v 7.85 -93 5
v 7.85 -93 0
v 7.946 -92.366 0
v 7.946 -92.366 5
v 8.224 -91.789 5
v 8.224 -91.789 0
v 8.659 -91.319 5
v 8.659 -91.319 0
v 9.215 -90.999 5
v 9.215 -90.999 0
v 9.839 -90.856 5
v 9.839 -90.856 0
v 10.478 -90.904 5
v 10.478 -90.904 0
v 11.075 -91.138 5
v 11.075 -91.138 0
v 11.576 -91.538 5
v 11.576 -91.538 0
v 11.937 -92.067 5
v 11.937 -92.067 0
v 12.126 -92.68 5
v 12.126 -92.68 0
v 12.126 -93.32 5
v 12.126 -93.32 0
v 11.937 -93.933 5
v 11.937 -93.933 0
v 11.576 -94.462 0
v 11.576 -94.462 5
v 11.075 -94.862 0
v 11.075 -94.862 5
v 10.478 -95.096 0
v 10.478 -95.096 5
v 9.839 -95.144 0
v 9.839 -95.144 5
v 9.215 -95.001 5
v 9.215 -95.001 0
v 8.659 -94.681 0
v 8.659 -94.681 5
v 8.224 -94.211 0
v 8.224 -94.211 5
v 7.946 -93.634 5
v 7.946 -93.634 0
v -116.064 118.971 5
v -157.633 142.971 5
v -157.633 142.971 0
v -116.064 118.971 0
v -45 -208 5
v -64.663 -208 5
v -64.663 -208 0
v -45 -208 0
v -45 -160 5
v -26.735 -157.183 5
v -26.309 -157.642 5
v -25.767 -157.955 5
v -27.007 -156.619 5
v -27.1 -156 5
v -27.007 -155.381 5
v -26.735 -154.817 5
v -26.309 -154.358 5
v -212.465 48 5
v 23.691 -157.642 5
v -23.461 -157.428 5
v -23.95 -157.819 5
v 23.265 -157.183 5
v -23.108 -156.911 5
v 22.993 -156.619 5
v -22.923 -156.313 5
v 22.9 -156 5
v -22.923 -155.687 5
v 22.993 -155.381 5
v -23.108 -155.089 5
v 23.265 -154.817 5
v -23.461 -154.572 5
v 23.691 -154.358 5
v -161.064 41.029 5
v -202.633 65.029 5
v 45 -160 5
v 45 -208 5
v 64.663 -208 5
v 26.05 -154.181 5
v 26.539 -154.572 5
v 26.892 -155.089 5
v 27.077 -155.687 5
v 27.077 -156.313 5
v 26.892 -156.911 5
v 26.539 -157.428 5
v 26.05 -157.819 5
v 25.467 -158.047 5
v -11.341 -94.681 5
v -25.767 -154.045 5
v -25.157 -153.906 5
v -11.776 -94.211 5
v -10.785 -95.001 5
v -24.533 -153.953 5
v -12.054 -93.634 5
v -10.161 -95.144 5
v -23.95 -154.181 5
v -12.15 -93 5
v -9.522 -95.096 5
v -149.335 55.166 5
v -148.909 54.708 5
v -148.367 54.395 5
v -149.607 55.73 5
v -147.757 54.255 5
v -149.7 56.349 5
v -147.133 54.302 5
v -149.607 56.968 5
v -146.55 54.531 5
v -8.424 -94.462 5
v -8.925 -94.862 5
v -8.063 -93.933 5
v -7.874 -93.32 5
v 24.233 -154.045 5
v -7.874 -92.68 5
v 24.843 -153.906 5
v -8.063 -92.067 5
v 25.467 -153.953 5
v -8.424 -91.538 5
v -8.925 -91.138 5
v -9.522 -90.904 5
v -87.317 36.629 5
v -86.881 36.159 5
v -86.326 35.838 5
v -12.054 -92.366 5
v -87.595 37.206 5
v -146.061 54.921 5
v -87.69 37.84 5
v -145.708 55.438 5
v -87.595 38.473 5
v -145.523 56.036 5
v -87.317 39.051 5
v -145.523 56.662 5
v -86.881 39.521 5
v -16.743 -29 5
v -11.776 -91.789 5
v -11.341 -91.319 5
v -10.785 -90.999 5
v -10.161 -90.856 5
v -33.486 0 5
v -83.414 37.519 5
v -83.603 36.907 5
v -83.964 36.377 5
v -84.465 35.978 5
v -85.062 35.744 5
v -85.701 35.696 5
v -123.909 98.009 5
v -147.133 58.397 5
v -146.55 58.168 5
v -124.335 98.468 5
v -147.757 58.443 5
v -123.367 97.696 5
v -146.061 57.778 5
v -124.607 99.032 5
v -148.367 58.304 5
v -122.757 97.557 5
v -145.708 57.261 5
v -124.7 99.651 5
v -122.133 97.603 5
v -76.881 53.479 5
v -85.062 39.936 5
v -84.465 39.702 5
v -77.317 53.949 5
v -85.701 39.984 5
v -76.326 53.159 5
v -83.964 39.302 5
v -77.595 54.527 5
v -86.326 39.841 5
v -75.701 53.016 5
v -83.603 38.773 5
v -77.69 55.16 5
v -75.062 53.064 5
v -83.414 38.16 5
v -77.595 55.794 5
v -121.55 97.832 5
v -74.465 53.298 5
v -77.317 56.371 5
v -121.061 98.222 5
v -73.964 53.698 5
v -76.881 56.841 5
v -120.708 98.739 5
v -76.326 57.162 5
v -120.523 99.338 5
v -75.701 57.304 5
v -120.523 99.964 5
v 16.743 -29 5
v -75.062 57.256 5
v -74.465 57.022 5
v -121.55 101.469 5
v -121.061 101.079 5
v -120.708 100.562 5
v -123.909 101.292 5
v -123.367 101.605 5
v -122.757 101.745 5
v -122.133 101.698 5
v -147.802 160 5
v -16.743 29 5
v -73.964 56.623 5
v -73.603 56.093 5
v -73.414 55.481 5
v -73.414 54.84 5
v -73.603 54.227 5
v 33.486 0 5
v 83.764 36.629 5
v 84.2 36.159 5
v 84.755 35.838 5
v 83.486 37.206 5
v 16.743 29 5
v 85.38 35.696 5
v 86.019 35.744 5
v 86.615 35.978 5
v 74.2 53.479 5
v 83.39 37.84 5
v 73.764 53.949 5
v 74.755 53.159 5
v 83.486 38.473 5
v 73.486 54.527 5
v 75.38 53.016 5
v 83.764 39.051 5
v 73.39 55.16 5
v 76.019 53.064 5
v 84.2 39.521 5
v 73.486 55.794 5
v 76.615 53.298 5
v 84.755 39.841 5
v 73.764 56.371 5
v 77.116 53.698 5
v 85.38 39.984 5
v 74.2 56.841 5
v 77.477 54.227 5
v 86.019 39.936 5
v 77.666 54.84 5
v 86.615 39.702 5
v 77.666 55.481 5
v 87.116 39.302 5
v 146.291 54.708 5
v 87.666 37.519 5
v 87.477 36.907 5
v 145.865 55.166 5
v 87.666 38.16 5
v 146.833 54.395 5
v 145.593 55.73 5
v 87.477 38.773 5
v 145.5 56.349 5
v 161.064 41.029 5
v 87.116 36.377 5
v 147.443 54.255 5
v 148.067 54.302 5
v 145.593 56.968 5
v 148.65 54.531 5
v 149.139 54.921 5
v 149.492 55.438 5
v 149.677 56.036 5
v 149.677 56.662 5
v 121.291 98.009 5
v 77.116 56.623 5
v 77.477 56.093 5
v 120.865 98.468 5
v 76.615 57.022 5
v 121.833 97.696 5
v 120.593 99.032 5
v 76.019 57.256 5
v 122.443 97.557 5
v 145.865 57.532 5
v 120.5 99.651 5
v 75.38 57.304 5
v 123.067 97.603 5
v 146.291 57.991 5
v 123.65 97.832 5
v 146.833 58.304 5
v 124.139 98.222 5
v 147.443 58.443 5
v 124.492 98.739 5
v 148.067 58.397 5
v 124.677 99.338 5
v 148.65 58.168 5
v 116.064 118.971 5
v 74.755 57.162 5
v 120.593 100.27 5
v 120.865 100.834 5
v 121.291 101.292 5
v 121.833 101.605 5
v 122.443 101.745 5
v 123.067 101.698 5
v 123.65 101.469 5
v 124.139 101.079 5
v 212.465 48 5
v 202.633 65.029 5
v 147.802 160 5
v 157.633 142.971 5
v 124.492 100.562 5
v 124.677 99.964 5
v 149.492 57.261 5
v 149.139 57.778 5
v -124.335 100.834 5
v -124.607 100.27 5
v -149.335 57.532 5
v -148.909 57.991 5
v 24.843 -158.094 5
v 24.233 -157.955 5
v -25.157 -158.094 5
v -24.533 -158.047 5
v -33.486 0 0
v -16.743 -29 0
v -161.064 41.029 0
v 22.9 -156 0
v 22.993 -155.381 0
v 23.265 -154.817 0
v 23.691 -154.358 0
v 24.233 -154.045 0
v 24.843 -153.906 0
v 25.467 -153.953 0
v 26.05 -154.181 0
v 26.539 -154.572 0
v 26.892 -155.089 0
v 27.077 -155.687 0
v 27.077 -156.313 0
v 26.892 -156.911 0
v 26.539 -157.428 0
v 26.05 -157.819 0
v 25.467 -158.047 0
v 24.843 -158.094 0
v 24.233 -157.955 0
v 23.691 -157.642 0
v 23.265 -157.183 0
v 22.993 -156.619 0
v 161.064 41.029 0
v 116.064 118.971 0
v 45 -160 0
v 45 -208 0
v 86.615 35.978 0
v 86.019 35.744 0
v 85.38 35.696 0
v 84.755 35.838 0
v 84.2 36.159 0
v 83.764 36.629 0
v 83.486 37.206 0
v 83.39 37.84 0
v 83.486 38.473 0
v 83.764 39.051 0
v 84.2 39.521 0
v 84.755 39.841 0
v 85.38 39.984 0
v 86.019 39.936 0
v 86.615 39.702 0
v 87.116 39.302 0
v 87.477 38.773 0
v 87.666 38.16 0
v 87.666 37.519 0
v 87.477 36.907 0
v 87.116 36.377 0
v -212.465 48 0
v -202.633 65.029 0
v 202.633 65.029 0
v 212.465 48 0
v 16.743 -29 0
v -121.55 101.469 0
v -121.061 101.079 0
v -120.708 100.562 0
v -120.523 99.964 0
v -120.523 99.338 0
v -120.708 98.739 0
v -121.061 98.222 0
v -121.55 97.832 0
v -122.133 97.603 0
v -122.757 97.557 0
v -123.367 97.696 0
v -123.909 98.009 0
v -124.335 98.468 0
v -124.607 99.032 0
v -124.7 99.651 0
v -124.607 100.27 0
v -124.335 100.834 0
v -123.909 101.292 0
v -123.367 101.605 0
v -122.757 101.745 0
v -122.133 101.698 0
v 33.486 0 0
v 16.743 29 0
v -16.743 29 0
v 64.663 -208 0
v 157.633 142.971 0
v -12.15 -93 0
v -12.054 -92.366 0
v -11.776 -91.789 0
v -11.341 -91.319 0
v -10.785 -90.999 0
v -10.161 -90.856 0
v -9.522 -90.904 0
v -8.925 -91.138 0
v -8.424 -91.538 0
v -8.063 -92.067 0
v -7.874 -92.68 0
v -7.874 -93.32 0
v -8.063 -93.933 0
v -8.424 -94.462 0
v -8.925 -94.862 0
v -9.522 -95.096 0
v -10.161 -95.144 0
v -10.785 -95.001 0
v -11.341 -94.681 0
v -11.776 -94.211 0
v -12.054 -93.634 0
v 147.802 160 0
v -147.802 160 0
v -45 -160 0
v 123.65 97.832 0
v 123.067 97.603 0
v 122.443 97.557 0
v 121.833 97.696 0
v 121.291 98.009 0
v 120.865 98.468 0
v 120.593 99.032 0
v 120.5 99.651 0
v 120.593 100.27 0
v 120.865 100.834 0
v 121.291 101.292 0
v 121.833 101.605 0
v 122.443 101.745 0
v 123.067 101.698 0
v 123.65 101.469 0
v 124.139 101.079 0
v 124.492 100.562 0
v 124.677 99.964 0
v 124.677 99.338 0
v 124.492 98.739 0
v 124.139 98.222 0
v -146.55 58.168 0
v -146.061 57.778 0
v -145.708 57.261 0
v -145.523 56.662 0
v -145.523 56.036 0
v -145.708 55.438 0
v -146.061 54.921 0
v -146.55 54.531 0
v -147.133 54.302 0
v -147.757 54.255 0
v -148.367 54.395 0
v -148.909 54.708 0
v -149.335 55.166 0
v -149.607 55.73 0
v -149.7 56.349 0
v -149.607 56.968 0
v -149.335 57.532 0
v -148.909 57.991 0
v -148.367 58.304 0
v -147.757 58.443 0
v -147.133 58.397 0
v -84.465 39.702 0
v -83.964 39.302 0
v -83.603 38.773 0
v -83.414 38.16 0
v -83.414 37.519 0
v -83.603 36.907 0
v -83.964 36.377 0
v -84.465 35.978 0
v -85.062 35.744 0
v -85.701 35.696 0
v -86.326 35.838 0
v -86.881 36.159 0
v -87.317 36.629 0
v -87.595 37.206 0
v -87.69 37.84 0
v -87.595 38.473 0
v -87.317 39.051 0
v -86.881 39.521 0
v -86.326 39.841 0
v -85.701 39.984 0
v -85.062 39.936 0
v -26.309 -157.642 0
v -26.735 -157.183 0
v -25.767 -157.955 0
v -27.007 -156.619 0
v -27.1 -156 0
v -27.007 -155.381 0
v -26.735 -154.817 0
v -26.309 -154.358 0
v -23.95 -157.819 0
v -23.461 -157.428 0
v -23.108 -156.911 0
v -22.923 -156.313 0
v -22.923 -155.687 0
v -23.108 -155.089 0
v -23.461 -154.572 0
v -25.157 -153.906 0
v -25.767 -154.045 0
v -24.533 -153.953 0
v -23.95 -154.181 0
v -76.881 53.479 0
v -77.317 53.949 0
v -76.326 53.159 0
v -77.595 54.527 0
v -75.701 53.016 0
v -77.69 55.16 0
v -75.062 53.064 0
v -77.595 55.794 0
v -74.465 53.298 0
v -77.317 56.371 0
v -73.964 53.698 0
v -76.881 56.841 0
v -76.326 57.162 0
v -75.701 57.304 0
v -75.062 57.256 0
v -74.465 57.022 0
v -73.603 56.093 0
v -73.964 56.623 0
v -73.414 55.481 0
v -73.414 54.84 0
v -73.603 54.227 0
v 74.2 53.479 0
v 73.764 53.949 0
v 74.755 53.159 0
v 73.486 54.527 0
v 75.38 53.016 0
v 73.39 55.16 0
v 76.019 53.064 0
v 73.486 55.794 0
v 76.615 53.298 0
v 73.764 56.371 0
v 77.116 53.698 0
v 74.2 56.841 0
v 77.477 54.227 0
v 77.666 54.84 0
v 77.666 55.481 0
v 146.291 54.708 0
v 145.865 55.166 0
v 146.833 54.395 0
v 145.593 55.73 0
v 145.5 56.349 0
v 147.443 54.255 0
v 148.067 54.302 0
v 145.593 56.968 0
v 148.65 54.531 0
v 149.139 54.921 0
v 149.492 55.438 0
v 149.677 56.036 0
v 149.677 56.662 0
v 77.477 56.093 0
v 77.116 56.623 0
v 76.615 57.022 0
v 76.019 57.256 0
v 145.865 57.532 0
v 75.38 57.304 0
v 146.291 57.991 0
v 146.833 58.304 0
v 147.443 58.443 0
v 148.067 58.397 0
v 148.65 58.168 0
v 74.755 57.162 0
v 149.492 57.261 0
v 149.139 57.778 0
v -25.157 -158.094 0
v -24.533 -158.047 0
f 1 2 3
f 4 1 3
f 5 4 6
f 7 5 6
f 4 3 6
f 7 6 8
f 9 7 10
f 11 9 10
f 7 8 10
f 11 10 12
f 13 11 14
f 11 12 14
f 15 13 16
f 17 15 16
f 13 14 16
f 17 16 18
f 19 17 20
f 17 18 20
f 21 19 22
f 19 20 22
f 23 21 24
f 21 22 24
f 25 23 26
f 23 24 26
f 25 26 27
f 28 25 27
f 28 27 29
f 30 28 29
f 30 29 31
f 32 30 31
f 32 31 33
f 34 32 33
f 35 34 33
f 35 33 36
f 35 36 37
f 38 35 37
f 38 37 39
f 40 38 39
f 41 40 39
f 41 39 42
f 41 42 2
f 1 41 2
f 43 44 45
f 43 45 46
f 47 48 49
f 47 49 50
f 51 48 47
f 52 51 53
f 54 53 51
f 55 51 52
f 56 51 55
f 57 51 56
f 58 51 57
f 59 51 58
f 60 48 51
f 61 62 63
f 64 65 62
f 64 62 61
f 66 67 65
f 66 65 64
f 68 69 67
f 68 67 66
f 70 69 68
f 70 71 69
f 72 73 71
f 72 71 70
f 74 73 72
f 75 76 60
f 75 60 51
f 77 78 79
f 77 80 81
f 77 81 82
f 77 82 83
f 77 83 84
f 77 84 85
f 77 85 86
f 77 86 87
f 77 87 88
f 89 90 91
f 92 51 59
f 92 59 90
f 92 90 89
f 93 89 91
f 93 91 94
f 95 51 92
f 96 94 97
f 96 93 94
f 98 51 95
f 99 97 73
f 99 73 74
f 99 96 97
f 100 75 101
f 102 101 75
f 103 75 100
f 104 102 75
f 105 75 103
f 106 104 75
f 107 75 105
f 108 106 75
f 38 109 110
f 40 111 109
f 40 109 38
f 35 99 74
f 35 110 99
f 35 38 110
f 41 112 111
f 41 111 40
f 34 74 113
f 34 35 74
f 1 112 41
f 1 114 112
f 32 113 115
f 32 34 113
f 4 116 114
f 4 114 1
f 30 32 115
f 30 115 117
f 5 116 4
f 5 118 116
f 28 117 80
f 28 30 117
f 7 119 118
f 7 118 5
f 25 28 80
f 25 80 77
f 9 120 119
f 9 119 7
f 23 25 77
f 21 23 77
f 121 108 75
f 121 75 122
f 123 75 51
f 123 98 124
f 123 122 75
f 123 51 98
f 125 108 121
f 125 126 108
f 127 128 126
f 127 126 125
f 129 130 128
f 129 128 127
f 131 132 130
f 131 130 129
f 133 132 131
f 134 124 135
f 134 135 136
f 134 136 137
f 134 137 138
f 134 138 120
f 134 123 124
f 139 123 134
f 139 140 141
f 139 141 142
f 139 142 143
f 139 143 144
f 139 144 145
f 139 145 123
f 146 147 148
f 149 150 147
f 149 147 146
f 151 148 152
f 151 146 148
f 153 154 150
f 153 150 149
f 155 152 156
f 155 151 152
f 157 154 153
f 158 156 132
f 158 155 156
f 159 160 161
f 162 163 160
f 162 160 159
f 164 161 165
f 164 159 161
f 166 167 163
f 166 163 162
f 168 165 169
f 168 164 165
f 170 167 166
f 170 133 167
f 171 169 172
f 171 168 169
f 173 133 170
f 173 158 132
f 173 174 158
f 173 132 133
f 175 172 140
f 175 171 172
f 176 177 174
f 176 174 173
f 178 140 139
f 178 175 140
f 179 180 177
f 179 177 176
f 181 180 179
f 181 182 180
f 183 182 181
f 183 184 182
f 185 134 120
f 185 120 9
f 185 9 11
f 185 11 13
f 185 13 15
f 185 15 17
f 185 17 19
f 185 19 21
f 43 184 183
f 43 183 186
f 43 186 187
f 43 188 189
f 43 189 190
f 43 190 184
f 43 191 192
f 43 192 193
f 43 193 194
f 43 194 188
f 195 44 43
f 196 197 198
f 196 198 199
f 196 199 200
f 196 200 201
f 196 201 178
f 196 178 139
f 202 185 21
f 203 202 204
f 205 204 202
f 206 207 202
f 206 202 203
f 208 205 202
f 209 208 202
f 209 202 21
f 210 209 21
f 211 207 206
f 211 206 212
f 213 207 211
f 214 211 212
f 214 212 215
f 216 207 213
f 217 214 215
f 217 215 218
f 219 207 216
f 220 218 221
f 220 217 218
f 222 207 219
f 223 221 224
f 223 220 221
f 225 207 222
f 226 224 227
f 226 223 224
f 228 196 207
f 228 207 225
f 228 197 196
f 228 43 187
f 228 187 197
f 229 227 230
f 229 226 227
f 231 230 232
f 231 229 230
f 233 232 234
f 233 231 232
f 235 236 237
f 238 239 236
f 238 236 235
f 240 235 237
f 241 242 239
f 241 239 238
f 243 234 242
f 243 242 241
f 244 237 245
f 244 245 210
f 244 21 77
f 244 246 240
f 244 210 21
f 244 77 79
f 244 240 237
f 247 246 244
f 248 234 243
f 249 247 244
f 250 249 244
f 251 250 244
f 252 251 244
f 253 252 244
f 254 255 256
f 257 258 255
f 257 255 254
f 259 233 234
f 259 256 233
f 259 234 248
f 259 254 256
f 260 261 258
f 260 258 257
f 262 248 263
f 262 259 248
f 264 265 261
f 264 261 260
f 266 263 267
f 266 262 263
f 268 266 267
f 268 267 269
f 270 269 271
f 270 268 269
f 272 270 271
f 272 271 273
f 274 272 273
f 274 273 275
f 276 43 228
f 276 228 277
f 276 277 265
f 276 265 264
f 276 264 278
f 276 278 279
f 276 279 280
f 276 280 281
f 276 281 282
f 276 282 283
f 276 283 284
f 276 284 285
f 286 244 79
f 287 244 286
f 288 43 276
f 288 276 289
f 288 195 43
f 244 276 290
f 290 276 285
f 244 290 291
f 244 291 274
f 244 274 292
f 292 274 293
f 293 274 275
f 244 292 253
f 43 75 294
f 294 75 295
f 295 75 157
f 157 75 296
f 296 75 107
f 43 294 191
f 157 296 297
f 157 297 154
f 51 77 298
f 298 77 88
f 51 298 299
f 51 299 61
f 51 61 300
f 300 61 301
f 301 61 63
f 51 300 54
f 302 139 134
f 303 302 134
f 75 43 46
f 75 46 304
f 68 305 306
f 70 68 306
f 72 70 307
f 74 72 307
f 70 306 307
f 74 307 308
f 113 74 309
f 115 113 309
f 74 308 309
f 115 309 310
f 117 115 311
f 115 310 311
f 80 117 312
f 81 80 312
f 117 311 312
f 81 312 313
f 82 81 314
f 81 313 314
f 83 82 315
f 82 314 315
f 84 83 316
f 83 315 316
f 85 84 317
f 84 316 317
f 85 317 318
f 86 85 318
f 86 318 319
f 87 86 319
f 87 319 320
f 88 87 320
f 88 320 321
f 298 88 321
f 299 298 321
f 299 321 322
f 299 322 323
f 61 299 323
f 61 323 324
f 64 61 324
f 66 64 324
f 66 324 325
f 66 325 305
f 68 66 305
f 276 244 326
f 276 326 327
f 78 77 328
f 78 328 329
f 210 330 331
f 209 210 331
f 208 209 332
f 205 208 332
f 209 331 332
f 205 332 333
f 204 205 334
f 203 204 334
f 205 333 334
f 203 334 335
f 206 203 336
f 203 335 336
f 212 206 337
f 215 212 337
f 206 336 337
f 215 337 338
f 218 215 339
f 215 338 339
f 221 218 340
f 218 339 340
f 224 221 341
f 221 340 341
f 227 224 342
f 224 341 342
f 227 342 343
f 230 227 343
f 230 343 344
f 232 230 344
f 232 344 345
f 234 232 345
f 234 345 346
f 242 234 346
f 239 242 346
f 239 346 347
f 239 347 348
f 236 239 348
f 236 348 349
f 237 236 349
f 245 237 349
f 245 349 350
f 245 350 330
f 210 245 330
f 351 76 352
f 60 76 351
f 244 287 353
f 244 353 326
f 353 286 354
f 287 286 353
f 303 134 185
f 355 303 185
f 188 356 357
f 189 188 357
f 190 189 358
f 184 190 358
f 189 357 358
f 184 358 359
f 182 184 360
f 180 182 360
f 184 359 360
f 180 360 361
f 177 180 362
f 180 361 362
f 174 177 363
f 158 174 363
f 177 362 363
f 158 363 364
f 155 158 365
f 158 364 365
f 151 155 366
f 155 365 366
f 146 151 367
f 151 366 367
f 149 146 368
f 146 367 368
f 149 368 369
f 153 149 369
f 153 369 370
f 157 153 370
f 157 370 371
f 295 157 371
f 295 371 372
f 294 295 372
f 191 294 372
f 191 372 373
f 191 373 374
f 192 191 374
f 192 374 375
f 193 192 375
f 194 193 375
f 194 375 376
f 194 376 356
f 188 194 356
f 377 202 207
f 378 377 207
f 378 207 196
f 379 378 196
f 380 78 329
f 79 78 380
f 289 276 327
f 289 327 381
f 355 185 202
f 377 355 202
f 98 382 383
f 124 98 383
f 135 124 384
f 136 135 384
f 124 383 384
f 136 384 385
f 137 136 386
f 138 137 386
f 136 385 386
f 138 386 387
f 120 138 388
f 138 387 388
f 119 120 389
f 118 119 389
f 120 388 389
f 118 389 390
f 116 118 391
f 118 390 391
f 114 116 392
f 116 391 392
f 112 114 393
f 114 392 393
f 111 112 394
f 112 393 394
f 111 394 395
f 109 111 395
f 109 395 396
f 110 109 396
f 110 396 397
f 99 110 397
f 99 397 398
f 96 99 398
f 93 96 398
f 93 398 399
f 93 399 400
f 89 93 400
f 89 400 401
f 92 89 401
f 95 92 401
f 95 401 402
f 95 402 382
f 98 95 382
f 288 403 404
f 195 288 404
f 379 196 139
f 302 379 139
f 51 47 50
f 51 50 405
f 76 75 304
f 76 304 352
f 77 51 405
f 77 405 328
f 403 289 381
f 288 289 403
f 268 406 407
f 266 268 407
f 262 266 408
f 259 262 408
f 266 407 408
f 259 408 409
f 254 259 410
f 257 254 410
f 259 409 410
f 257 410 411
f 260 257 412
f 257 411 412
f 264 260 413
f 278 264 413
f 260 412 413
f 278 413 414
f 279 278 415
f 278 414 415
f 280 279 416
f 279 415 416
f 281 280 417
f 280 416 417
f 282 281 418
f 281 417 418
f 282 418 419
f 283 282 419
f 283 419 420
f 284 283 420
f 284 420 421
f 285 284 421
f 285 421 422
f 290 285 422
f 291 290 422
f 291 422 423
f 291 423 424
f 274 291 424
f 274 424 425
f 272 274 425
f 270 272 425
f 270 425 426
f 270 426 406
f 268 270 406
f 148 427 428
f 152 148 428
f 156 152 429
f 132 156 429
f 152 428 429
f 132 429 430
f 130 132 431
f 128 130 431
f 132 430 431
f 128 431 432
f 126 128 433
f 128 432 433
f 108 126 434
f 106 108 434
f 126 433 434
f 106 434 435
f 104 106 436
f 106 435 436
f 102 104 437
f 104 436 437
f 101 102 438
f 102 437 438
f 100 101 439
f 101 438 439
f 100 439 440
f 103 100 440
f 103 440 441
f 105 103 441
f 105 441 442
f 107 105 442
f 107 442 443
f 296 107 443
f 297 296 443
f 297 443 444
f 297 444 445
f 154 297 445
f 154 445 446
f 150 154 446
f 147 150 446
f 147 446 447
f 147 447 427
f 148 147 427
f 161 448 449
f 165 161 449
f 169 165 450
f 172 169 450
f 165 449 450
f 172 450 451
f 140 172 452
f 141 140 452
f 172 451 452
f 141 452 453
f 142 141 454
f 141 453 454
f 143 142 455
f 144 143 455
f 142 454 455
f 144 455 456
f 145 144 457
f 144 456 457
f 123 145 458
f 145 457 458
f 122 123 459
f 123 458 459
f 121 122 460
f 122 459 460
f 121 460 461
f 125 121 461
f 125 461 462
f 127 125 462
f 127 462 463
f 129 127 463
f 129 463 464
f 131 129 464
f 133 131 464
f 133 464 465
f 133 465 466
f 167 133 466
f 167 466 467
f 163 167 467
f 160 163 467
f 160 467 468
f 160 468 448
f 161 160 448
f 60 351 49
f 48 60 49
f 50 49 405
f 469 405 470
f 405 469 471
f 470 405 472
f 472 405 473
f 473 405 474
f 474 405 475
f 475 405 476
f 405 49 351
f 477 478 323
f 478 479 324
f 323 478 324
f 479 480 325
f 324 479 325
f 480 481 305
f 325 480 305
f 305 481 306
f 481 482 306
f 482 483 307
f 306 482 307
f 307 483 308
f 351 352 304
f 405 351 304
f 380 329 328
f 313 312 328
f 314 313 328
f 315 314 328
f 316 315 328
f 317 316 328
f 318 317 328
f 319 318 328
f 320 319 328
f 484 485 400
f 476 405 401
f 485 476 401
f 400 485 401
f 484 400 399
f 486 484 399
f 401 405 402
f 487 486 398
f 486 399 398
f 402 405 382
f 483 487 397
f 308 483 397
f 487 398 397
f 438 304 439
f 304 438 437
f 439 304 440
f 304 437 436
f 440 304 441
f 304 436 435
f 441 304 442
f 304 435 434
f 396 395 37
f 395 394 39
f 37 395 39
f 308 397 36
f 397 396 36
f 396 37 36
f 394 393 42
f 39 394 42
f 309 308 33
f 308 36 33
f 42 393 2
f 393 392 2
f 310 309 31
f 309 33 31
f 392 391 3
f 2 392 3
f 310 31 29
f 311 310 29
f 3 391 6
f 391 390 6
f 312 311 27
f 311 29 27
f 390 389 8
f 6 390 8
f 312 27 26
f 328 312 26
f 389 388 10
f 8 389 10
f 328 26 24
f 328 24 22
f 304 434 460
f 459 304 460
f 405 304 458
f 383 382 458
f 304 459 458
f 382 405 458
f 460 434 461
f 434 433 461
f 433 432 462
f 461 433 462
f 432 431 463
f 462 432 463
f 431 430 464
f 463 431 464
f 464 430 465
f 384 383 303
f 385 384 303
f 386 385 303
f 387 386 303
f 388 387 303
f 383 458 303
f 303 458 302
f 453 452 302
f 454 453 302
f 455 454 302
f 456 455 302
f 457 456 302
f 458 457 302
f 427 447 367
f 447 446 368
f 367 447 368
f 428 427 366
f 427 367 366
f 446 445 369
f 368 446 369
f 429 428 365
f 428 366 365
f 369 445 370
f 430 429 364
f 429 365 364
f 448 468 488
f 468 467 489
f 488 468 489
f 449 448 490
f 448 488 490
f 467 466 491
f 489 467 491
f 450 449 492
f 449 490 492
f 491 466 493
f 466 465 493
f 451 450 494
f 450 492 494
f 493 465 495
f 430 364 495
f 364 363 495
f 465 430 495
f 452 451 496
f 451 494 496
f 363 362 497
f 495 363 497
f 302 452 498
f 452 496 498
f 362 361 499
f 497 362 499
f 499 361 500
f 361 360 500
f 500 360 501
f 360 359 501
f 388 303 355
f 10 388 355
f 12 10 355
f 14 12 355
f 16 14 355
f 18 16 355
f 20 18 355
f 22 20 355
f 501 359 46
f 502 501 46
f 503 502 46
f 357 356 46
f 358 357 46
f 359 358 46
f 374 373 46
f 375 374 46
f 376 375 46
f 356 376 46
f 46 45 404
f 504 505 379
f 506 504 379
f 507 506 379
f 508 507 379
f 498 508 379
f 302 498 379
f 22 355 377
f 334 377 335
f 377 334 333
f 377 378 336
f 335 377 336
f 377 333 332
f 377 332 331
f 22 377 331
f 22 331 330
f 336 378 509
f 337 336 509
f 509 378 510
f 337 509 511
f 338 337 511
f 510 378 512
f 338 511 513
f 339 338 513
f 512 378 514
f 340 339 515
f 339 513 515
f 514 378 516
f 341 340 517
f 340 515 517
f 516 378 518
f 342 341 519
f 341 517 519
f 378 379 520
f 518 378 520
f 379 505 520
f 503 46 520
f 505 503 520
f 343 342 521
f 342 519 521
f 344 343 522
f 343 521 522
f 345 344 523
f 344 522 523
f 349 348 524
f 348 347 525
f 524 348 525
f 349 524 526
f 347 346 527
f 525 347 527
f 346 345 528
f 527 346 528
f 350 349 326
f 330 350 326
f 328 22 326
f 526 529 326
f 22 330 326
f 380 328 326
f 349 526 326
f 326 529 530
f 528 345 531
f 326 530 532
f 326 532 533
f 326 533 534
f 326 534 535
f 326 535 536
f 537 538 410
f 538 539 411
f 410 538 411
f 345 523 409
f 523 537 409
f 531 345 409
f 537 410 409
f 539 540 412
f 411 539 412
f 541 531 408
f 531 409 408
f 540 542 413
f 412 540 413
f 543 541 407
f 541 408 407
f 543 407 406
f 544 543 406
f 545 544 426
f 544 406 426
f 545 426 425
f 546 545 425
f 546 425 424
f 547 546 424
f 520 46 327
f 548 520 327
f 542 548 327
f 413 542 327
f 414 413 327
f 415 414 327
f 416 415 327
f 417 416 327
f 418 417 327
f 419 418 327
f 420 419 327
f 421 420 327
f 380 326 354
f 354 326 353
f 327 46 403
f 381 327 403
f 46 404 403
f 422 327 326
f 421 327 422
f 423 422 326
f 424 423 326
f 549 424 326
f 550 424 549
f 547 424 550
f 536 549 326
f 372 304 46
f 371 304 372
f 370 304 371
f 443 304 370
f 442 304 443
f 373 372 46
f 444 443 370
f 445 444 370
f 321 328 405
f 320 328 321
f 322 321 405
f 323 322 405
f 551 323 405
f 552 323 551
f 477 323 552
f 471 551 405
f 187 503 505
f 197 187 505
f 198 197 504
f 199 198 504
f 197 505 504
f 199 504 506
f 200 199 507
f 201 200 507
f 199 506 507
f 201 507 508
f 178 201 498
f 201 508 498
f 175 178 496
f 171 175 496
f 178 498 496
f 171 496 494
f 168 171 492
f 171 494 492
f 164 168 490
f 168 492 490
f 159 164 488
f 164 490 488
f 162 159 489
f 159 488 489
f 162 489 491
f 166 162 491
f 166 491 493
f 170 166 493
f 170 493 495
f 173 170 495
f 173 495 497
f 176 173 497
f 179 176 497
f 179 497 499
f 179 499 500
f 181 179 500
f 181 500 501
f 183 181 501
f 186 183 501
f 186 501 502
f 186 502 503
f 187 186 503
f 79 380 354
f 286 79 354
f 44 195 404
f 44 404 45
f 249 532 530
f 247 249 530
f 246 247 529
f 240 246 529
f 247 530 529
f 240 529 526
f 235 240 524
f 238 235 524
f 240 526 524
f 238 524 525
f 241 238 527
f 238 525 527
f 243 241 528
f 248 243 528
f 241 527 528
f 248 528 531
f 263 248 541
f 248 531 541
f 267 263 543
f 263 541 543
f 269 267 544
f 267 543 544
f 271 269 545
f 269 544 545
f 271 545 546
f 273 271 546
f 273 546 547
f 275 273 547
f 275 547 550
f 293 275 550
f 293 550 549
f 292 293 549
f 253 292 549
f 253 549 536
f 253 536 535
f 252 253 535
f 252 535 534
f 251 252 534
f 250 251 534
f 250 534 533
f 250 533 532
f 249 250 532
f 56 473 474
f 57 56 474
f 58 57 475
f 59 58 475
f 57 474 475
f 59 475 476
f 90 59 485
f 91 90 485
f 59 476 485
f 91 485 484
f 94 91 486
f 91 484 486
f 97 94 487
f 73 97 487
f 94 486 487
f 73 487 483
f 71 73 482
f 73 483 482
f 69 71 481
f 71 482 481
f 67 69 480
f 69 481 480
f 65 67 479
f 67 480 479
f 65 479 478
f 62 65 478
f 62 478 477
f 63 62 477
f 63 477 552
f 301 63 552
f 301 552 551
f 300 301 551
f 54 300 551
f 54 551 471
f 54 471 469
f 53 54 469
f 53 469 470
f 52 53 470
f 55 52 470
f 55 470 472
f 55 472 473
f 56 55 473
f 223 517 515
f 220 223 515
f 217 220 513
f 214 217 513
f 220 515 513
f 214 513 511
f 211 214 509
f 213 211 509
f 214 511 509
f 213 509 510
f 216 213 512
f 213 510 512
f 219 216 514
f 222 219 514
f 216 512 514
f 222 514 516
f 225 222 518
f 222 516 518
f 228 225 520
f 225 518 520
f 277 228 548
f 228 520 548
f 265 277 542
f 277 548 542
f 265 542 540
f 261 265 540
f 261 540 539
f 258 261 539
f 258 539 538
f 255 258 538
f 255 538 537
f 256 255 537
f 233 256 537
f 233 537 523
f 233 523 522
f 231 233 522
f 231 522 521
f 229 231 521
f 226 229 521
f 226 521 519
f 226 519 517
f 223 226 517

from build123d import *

# Parameters (mm, degrees)
EXTRUDE_1_DEPTH          = 5
CUT_EXTRUDE_1_DEPTH      = 424.349737215
M5X0_8_1_D               = 4.2
HOLE_WIZARD_M4_1_D       = 4.3
PATTERN_CIRCULAR_1_COUNT = 3
CUT_EXTRUDE_2_DEPTH      = 298.372381591


with BuildPart() as part:
    # 草圖1 → 填料-伸長1 (new body)
    with BuildSketch(Plane.XY):
        Polygon((0, -320), (277.128129211, 160), (-277.128129211, 160), align=None)
    extrude(amount=EXTRUDE_1_DEPTH)

    # 草圖6 → 除料-伸長1 (cut, through all)
    with BuildSketch(Plane.XY.offset(5)):
        Polygon((-64.663230149, -208), (-45, -208), (-45, -160), (45, -160), (45, -208), (64.663230149, -208), (0, -320), align=None)
    cut_extrude_1 = extrude(amount=-CUT_EXTRUDE_1_DEPTH, mode=Mode.SUBTRACT)

    # M5x0.8 螺紋孔1 (through all)
    with Locations(Plane.XY.offset(5)):
        with Locations((25, -156), (-25, -156)):
            m5x0_8_1 = Hole(M5X0_8_1_D / 2)

    # M4 餘隙孔1 (through all)
    with Locations(Plane.XY.offset(5)):
        with Locations((10, -93), (-10, -93)):
            hole_wizard_m4_1 = Hole(HOLE_WIZARD_M4_1_D / 2)

    # 環狀複製排列1: 除料-伸長1, M5x0.8 螺紋孔1, M4 餘隙孔1 ×3 about axis
    pattern_circular_1_axis = Axis((0, 0, -0.25), (0, 0, 1))
    add([cut_extrude_1.rotate(pattern_circular_1_axis, i * 360 / PATTERN_CIRCULAR_1_COUNT) for i in range(1, PATTERN_CIRCULAR_1_COUNT)], mode=Mode.SUBTRACT)
    add([m5x0_8_1.rotate(pattern_circular_1_axis, i * 360 / PATTERN_CIRCULAR_1_COUNT) for i in range(1, PATTERN_CIRCULAR_1_COUNT)], mode=Mode.SUBTRACT)
    add([hole_wizard_m4_1.rotate(pattern_circular_1_axis, i * 360 / PATTERN_CIRCULAR_1_COUNT) for i in range(1, PATTERN_CIRCULAR_1_COUNT)], mode=Mode.SUBTRACT)

    # 草圖11 → 除料-伸長2 (cut, through all)
    with BuildSketch(Plane.XY.offset(5)):
        Polygon((33.486315613, 0), (16.743157806, 29), (-16.743157806, 29), (-33.486315613, 0), (-16.743157806, -29), (16.743157806, -29), align=None)
    extrude(amount=-CUT_EXTRUDE_2_DEPTH, mode=Mode.SUBTRACT)


solid = part.part
